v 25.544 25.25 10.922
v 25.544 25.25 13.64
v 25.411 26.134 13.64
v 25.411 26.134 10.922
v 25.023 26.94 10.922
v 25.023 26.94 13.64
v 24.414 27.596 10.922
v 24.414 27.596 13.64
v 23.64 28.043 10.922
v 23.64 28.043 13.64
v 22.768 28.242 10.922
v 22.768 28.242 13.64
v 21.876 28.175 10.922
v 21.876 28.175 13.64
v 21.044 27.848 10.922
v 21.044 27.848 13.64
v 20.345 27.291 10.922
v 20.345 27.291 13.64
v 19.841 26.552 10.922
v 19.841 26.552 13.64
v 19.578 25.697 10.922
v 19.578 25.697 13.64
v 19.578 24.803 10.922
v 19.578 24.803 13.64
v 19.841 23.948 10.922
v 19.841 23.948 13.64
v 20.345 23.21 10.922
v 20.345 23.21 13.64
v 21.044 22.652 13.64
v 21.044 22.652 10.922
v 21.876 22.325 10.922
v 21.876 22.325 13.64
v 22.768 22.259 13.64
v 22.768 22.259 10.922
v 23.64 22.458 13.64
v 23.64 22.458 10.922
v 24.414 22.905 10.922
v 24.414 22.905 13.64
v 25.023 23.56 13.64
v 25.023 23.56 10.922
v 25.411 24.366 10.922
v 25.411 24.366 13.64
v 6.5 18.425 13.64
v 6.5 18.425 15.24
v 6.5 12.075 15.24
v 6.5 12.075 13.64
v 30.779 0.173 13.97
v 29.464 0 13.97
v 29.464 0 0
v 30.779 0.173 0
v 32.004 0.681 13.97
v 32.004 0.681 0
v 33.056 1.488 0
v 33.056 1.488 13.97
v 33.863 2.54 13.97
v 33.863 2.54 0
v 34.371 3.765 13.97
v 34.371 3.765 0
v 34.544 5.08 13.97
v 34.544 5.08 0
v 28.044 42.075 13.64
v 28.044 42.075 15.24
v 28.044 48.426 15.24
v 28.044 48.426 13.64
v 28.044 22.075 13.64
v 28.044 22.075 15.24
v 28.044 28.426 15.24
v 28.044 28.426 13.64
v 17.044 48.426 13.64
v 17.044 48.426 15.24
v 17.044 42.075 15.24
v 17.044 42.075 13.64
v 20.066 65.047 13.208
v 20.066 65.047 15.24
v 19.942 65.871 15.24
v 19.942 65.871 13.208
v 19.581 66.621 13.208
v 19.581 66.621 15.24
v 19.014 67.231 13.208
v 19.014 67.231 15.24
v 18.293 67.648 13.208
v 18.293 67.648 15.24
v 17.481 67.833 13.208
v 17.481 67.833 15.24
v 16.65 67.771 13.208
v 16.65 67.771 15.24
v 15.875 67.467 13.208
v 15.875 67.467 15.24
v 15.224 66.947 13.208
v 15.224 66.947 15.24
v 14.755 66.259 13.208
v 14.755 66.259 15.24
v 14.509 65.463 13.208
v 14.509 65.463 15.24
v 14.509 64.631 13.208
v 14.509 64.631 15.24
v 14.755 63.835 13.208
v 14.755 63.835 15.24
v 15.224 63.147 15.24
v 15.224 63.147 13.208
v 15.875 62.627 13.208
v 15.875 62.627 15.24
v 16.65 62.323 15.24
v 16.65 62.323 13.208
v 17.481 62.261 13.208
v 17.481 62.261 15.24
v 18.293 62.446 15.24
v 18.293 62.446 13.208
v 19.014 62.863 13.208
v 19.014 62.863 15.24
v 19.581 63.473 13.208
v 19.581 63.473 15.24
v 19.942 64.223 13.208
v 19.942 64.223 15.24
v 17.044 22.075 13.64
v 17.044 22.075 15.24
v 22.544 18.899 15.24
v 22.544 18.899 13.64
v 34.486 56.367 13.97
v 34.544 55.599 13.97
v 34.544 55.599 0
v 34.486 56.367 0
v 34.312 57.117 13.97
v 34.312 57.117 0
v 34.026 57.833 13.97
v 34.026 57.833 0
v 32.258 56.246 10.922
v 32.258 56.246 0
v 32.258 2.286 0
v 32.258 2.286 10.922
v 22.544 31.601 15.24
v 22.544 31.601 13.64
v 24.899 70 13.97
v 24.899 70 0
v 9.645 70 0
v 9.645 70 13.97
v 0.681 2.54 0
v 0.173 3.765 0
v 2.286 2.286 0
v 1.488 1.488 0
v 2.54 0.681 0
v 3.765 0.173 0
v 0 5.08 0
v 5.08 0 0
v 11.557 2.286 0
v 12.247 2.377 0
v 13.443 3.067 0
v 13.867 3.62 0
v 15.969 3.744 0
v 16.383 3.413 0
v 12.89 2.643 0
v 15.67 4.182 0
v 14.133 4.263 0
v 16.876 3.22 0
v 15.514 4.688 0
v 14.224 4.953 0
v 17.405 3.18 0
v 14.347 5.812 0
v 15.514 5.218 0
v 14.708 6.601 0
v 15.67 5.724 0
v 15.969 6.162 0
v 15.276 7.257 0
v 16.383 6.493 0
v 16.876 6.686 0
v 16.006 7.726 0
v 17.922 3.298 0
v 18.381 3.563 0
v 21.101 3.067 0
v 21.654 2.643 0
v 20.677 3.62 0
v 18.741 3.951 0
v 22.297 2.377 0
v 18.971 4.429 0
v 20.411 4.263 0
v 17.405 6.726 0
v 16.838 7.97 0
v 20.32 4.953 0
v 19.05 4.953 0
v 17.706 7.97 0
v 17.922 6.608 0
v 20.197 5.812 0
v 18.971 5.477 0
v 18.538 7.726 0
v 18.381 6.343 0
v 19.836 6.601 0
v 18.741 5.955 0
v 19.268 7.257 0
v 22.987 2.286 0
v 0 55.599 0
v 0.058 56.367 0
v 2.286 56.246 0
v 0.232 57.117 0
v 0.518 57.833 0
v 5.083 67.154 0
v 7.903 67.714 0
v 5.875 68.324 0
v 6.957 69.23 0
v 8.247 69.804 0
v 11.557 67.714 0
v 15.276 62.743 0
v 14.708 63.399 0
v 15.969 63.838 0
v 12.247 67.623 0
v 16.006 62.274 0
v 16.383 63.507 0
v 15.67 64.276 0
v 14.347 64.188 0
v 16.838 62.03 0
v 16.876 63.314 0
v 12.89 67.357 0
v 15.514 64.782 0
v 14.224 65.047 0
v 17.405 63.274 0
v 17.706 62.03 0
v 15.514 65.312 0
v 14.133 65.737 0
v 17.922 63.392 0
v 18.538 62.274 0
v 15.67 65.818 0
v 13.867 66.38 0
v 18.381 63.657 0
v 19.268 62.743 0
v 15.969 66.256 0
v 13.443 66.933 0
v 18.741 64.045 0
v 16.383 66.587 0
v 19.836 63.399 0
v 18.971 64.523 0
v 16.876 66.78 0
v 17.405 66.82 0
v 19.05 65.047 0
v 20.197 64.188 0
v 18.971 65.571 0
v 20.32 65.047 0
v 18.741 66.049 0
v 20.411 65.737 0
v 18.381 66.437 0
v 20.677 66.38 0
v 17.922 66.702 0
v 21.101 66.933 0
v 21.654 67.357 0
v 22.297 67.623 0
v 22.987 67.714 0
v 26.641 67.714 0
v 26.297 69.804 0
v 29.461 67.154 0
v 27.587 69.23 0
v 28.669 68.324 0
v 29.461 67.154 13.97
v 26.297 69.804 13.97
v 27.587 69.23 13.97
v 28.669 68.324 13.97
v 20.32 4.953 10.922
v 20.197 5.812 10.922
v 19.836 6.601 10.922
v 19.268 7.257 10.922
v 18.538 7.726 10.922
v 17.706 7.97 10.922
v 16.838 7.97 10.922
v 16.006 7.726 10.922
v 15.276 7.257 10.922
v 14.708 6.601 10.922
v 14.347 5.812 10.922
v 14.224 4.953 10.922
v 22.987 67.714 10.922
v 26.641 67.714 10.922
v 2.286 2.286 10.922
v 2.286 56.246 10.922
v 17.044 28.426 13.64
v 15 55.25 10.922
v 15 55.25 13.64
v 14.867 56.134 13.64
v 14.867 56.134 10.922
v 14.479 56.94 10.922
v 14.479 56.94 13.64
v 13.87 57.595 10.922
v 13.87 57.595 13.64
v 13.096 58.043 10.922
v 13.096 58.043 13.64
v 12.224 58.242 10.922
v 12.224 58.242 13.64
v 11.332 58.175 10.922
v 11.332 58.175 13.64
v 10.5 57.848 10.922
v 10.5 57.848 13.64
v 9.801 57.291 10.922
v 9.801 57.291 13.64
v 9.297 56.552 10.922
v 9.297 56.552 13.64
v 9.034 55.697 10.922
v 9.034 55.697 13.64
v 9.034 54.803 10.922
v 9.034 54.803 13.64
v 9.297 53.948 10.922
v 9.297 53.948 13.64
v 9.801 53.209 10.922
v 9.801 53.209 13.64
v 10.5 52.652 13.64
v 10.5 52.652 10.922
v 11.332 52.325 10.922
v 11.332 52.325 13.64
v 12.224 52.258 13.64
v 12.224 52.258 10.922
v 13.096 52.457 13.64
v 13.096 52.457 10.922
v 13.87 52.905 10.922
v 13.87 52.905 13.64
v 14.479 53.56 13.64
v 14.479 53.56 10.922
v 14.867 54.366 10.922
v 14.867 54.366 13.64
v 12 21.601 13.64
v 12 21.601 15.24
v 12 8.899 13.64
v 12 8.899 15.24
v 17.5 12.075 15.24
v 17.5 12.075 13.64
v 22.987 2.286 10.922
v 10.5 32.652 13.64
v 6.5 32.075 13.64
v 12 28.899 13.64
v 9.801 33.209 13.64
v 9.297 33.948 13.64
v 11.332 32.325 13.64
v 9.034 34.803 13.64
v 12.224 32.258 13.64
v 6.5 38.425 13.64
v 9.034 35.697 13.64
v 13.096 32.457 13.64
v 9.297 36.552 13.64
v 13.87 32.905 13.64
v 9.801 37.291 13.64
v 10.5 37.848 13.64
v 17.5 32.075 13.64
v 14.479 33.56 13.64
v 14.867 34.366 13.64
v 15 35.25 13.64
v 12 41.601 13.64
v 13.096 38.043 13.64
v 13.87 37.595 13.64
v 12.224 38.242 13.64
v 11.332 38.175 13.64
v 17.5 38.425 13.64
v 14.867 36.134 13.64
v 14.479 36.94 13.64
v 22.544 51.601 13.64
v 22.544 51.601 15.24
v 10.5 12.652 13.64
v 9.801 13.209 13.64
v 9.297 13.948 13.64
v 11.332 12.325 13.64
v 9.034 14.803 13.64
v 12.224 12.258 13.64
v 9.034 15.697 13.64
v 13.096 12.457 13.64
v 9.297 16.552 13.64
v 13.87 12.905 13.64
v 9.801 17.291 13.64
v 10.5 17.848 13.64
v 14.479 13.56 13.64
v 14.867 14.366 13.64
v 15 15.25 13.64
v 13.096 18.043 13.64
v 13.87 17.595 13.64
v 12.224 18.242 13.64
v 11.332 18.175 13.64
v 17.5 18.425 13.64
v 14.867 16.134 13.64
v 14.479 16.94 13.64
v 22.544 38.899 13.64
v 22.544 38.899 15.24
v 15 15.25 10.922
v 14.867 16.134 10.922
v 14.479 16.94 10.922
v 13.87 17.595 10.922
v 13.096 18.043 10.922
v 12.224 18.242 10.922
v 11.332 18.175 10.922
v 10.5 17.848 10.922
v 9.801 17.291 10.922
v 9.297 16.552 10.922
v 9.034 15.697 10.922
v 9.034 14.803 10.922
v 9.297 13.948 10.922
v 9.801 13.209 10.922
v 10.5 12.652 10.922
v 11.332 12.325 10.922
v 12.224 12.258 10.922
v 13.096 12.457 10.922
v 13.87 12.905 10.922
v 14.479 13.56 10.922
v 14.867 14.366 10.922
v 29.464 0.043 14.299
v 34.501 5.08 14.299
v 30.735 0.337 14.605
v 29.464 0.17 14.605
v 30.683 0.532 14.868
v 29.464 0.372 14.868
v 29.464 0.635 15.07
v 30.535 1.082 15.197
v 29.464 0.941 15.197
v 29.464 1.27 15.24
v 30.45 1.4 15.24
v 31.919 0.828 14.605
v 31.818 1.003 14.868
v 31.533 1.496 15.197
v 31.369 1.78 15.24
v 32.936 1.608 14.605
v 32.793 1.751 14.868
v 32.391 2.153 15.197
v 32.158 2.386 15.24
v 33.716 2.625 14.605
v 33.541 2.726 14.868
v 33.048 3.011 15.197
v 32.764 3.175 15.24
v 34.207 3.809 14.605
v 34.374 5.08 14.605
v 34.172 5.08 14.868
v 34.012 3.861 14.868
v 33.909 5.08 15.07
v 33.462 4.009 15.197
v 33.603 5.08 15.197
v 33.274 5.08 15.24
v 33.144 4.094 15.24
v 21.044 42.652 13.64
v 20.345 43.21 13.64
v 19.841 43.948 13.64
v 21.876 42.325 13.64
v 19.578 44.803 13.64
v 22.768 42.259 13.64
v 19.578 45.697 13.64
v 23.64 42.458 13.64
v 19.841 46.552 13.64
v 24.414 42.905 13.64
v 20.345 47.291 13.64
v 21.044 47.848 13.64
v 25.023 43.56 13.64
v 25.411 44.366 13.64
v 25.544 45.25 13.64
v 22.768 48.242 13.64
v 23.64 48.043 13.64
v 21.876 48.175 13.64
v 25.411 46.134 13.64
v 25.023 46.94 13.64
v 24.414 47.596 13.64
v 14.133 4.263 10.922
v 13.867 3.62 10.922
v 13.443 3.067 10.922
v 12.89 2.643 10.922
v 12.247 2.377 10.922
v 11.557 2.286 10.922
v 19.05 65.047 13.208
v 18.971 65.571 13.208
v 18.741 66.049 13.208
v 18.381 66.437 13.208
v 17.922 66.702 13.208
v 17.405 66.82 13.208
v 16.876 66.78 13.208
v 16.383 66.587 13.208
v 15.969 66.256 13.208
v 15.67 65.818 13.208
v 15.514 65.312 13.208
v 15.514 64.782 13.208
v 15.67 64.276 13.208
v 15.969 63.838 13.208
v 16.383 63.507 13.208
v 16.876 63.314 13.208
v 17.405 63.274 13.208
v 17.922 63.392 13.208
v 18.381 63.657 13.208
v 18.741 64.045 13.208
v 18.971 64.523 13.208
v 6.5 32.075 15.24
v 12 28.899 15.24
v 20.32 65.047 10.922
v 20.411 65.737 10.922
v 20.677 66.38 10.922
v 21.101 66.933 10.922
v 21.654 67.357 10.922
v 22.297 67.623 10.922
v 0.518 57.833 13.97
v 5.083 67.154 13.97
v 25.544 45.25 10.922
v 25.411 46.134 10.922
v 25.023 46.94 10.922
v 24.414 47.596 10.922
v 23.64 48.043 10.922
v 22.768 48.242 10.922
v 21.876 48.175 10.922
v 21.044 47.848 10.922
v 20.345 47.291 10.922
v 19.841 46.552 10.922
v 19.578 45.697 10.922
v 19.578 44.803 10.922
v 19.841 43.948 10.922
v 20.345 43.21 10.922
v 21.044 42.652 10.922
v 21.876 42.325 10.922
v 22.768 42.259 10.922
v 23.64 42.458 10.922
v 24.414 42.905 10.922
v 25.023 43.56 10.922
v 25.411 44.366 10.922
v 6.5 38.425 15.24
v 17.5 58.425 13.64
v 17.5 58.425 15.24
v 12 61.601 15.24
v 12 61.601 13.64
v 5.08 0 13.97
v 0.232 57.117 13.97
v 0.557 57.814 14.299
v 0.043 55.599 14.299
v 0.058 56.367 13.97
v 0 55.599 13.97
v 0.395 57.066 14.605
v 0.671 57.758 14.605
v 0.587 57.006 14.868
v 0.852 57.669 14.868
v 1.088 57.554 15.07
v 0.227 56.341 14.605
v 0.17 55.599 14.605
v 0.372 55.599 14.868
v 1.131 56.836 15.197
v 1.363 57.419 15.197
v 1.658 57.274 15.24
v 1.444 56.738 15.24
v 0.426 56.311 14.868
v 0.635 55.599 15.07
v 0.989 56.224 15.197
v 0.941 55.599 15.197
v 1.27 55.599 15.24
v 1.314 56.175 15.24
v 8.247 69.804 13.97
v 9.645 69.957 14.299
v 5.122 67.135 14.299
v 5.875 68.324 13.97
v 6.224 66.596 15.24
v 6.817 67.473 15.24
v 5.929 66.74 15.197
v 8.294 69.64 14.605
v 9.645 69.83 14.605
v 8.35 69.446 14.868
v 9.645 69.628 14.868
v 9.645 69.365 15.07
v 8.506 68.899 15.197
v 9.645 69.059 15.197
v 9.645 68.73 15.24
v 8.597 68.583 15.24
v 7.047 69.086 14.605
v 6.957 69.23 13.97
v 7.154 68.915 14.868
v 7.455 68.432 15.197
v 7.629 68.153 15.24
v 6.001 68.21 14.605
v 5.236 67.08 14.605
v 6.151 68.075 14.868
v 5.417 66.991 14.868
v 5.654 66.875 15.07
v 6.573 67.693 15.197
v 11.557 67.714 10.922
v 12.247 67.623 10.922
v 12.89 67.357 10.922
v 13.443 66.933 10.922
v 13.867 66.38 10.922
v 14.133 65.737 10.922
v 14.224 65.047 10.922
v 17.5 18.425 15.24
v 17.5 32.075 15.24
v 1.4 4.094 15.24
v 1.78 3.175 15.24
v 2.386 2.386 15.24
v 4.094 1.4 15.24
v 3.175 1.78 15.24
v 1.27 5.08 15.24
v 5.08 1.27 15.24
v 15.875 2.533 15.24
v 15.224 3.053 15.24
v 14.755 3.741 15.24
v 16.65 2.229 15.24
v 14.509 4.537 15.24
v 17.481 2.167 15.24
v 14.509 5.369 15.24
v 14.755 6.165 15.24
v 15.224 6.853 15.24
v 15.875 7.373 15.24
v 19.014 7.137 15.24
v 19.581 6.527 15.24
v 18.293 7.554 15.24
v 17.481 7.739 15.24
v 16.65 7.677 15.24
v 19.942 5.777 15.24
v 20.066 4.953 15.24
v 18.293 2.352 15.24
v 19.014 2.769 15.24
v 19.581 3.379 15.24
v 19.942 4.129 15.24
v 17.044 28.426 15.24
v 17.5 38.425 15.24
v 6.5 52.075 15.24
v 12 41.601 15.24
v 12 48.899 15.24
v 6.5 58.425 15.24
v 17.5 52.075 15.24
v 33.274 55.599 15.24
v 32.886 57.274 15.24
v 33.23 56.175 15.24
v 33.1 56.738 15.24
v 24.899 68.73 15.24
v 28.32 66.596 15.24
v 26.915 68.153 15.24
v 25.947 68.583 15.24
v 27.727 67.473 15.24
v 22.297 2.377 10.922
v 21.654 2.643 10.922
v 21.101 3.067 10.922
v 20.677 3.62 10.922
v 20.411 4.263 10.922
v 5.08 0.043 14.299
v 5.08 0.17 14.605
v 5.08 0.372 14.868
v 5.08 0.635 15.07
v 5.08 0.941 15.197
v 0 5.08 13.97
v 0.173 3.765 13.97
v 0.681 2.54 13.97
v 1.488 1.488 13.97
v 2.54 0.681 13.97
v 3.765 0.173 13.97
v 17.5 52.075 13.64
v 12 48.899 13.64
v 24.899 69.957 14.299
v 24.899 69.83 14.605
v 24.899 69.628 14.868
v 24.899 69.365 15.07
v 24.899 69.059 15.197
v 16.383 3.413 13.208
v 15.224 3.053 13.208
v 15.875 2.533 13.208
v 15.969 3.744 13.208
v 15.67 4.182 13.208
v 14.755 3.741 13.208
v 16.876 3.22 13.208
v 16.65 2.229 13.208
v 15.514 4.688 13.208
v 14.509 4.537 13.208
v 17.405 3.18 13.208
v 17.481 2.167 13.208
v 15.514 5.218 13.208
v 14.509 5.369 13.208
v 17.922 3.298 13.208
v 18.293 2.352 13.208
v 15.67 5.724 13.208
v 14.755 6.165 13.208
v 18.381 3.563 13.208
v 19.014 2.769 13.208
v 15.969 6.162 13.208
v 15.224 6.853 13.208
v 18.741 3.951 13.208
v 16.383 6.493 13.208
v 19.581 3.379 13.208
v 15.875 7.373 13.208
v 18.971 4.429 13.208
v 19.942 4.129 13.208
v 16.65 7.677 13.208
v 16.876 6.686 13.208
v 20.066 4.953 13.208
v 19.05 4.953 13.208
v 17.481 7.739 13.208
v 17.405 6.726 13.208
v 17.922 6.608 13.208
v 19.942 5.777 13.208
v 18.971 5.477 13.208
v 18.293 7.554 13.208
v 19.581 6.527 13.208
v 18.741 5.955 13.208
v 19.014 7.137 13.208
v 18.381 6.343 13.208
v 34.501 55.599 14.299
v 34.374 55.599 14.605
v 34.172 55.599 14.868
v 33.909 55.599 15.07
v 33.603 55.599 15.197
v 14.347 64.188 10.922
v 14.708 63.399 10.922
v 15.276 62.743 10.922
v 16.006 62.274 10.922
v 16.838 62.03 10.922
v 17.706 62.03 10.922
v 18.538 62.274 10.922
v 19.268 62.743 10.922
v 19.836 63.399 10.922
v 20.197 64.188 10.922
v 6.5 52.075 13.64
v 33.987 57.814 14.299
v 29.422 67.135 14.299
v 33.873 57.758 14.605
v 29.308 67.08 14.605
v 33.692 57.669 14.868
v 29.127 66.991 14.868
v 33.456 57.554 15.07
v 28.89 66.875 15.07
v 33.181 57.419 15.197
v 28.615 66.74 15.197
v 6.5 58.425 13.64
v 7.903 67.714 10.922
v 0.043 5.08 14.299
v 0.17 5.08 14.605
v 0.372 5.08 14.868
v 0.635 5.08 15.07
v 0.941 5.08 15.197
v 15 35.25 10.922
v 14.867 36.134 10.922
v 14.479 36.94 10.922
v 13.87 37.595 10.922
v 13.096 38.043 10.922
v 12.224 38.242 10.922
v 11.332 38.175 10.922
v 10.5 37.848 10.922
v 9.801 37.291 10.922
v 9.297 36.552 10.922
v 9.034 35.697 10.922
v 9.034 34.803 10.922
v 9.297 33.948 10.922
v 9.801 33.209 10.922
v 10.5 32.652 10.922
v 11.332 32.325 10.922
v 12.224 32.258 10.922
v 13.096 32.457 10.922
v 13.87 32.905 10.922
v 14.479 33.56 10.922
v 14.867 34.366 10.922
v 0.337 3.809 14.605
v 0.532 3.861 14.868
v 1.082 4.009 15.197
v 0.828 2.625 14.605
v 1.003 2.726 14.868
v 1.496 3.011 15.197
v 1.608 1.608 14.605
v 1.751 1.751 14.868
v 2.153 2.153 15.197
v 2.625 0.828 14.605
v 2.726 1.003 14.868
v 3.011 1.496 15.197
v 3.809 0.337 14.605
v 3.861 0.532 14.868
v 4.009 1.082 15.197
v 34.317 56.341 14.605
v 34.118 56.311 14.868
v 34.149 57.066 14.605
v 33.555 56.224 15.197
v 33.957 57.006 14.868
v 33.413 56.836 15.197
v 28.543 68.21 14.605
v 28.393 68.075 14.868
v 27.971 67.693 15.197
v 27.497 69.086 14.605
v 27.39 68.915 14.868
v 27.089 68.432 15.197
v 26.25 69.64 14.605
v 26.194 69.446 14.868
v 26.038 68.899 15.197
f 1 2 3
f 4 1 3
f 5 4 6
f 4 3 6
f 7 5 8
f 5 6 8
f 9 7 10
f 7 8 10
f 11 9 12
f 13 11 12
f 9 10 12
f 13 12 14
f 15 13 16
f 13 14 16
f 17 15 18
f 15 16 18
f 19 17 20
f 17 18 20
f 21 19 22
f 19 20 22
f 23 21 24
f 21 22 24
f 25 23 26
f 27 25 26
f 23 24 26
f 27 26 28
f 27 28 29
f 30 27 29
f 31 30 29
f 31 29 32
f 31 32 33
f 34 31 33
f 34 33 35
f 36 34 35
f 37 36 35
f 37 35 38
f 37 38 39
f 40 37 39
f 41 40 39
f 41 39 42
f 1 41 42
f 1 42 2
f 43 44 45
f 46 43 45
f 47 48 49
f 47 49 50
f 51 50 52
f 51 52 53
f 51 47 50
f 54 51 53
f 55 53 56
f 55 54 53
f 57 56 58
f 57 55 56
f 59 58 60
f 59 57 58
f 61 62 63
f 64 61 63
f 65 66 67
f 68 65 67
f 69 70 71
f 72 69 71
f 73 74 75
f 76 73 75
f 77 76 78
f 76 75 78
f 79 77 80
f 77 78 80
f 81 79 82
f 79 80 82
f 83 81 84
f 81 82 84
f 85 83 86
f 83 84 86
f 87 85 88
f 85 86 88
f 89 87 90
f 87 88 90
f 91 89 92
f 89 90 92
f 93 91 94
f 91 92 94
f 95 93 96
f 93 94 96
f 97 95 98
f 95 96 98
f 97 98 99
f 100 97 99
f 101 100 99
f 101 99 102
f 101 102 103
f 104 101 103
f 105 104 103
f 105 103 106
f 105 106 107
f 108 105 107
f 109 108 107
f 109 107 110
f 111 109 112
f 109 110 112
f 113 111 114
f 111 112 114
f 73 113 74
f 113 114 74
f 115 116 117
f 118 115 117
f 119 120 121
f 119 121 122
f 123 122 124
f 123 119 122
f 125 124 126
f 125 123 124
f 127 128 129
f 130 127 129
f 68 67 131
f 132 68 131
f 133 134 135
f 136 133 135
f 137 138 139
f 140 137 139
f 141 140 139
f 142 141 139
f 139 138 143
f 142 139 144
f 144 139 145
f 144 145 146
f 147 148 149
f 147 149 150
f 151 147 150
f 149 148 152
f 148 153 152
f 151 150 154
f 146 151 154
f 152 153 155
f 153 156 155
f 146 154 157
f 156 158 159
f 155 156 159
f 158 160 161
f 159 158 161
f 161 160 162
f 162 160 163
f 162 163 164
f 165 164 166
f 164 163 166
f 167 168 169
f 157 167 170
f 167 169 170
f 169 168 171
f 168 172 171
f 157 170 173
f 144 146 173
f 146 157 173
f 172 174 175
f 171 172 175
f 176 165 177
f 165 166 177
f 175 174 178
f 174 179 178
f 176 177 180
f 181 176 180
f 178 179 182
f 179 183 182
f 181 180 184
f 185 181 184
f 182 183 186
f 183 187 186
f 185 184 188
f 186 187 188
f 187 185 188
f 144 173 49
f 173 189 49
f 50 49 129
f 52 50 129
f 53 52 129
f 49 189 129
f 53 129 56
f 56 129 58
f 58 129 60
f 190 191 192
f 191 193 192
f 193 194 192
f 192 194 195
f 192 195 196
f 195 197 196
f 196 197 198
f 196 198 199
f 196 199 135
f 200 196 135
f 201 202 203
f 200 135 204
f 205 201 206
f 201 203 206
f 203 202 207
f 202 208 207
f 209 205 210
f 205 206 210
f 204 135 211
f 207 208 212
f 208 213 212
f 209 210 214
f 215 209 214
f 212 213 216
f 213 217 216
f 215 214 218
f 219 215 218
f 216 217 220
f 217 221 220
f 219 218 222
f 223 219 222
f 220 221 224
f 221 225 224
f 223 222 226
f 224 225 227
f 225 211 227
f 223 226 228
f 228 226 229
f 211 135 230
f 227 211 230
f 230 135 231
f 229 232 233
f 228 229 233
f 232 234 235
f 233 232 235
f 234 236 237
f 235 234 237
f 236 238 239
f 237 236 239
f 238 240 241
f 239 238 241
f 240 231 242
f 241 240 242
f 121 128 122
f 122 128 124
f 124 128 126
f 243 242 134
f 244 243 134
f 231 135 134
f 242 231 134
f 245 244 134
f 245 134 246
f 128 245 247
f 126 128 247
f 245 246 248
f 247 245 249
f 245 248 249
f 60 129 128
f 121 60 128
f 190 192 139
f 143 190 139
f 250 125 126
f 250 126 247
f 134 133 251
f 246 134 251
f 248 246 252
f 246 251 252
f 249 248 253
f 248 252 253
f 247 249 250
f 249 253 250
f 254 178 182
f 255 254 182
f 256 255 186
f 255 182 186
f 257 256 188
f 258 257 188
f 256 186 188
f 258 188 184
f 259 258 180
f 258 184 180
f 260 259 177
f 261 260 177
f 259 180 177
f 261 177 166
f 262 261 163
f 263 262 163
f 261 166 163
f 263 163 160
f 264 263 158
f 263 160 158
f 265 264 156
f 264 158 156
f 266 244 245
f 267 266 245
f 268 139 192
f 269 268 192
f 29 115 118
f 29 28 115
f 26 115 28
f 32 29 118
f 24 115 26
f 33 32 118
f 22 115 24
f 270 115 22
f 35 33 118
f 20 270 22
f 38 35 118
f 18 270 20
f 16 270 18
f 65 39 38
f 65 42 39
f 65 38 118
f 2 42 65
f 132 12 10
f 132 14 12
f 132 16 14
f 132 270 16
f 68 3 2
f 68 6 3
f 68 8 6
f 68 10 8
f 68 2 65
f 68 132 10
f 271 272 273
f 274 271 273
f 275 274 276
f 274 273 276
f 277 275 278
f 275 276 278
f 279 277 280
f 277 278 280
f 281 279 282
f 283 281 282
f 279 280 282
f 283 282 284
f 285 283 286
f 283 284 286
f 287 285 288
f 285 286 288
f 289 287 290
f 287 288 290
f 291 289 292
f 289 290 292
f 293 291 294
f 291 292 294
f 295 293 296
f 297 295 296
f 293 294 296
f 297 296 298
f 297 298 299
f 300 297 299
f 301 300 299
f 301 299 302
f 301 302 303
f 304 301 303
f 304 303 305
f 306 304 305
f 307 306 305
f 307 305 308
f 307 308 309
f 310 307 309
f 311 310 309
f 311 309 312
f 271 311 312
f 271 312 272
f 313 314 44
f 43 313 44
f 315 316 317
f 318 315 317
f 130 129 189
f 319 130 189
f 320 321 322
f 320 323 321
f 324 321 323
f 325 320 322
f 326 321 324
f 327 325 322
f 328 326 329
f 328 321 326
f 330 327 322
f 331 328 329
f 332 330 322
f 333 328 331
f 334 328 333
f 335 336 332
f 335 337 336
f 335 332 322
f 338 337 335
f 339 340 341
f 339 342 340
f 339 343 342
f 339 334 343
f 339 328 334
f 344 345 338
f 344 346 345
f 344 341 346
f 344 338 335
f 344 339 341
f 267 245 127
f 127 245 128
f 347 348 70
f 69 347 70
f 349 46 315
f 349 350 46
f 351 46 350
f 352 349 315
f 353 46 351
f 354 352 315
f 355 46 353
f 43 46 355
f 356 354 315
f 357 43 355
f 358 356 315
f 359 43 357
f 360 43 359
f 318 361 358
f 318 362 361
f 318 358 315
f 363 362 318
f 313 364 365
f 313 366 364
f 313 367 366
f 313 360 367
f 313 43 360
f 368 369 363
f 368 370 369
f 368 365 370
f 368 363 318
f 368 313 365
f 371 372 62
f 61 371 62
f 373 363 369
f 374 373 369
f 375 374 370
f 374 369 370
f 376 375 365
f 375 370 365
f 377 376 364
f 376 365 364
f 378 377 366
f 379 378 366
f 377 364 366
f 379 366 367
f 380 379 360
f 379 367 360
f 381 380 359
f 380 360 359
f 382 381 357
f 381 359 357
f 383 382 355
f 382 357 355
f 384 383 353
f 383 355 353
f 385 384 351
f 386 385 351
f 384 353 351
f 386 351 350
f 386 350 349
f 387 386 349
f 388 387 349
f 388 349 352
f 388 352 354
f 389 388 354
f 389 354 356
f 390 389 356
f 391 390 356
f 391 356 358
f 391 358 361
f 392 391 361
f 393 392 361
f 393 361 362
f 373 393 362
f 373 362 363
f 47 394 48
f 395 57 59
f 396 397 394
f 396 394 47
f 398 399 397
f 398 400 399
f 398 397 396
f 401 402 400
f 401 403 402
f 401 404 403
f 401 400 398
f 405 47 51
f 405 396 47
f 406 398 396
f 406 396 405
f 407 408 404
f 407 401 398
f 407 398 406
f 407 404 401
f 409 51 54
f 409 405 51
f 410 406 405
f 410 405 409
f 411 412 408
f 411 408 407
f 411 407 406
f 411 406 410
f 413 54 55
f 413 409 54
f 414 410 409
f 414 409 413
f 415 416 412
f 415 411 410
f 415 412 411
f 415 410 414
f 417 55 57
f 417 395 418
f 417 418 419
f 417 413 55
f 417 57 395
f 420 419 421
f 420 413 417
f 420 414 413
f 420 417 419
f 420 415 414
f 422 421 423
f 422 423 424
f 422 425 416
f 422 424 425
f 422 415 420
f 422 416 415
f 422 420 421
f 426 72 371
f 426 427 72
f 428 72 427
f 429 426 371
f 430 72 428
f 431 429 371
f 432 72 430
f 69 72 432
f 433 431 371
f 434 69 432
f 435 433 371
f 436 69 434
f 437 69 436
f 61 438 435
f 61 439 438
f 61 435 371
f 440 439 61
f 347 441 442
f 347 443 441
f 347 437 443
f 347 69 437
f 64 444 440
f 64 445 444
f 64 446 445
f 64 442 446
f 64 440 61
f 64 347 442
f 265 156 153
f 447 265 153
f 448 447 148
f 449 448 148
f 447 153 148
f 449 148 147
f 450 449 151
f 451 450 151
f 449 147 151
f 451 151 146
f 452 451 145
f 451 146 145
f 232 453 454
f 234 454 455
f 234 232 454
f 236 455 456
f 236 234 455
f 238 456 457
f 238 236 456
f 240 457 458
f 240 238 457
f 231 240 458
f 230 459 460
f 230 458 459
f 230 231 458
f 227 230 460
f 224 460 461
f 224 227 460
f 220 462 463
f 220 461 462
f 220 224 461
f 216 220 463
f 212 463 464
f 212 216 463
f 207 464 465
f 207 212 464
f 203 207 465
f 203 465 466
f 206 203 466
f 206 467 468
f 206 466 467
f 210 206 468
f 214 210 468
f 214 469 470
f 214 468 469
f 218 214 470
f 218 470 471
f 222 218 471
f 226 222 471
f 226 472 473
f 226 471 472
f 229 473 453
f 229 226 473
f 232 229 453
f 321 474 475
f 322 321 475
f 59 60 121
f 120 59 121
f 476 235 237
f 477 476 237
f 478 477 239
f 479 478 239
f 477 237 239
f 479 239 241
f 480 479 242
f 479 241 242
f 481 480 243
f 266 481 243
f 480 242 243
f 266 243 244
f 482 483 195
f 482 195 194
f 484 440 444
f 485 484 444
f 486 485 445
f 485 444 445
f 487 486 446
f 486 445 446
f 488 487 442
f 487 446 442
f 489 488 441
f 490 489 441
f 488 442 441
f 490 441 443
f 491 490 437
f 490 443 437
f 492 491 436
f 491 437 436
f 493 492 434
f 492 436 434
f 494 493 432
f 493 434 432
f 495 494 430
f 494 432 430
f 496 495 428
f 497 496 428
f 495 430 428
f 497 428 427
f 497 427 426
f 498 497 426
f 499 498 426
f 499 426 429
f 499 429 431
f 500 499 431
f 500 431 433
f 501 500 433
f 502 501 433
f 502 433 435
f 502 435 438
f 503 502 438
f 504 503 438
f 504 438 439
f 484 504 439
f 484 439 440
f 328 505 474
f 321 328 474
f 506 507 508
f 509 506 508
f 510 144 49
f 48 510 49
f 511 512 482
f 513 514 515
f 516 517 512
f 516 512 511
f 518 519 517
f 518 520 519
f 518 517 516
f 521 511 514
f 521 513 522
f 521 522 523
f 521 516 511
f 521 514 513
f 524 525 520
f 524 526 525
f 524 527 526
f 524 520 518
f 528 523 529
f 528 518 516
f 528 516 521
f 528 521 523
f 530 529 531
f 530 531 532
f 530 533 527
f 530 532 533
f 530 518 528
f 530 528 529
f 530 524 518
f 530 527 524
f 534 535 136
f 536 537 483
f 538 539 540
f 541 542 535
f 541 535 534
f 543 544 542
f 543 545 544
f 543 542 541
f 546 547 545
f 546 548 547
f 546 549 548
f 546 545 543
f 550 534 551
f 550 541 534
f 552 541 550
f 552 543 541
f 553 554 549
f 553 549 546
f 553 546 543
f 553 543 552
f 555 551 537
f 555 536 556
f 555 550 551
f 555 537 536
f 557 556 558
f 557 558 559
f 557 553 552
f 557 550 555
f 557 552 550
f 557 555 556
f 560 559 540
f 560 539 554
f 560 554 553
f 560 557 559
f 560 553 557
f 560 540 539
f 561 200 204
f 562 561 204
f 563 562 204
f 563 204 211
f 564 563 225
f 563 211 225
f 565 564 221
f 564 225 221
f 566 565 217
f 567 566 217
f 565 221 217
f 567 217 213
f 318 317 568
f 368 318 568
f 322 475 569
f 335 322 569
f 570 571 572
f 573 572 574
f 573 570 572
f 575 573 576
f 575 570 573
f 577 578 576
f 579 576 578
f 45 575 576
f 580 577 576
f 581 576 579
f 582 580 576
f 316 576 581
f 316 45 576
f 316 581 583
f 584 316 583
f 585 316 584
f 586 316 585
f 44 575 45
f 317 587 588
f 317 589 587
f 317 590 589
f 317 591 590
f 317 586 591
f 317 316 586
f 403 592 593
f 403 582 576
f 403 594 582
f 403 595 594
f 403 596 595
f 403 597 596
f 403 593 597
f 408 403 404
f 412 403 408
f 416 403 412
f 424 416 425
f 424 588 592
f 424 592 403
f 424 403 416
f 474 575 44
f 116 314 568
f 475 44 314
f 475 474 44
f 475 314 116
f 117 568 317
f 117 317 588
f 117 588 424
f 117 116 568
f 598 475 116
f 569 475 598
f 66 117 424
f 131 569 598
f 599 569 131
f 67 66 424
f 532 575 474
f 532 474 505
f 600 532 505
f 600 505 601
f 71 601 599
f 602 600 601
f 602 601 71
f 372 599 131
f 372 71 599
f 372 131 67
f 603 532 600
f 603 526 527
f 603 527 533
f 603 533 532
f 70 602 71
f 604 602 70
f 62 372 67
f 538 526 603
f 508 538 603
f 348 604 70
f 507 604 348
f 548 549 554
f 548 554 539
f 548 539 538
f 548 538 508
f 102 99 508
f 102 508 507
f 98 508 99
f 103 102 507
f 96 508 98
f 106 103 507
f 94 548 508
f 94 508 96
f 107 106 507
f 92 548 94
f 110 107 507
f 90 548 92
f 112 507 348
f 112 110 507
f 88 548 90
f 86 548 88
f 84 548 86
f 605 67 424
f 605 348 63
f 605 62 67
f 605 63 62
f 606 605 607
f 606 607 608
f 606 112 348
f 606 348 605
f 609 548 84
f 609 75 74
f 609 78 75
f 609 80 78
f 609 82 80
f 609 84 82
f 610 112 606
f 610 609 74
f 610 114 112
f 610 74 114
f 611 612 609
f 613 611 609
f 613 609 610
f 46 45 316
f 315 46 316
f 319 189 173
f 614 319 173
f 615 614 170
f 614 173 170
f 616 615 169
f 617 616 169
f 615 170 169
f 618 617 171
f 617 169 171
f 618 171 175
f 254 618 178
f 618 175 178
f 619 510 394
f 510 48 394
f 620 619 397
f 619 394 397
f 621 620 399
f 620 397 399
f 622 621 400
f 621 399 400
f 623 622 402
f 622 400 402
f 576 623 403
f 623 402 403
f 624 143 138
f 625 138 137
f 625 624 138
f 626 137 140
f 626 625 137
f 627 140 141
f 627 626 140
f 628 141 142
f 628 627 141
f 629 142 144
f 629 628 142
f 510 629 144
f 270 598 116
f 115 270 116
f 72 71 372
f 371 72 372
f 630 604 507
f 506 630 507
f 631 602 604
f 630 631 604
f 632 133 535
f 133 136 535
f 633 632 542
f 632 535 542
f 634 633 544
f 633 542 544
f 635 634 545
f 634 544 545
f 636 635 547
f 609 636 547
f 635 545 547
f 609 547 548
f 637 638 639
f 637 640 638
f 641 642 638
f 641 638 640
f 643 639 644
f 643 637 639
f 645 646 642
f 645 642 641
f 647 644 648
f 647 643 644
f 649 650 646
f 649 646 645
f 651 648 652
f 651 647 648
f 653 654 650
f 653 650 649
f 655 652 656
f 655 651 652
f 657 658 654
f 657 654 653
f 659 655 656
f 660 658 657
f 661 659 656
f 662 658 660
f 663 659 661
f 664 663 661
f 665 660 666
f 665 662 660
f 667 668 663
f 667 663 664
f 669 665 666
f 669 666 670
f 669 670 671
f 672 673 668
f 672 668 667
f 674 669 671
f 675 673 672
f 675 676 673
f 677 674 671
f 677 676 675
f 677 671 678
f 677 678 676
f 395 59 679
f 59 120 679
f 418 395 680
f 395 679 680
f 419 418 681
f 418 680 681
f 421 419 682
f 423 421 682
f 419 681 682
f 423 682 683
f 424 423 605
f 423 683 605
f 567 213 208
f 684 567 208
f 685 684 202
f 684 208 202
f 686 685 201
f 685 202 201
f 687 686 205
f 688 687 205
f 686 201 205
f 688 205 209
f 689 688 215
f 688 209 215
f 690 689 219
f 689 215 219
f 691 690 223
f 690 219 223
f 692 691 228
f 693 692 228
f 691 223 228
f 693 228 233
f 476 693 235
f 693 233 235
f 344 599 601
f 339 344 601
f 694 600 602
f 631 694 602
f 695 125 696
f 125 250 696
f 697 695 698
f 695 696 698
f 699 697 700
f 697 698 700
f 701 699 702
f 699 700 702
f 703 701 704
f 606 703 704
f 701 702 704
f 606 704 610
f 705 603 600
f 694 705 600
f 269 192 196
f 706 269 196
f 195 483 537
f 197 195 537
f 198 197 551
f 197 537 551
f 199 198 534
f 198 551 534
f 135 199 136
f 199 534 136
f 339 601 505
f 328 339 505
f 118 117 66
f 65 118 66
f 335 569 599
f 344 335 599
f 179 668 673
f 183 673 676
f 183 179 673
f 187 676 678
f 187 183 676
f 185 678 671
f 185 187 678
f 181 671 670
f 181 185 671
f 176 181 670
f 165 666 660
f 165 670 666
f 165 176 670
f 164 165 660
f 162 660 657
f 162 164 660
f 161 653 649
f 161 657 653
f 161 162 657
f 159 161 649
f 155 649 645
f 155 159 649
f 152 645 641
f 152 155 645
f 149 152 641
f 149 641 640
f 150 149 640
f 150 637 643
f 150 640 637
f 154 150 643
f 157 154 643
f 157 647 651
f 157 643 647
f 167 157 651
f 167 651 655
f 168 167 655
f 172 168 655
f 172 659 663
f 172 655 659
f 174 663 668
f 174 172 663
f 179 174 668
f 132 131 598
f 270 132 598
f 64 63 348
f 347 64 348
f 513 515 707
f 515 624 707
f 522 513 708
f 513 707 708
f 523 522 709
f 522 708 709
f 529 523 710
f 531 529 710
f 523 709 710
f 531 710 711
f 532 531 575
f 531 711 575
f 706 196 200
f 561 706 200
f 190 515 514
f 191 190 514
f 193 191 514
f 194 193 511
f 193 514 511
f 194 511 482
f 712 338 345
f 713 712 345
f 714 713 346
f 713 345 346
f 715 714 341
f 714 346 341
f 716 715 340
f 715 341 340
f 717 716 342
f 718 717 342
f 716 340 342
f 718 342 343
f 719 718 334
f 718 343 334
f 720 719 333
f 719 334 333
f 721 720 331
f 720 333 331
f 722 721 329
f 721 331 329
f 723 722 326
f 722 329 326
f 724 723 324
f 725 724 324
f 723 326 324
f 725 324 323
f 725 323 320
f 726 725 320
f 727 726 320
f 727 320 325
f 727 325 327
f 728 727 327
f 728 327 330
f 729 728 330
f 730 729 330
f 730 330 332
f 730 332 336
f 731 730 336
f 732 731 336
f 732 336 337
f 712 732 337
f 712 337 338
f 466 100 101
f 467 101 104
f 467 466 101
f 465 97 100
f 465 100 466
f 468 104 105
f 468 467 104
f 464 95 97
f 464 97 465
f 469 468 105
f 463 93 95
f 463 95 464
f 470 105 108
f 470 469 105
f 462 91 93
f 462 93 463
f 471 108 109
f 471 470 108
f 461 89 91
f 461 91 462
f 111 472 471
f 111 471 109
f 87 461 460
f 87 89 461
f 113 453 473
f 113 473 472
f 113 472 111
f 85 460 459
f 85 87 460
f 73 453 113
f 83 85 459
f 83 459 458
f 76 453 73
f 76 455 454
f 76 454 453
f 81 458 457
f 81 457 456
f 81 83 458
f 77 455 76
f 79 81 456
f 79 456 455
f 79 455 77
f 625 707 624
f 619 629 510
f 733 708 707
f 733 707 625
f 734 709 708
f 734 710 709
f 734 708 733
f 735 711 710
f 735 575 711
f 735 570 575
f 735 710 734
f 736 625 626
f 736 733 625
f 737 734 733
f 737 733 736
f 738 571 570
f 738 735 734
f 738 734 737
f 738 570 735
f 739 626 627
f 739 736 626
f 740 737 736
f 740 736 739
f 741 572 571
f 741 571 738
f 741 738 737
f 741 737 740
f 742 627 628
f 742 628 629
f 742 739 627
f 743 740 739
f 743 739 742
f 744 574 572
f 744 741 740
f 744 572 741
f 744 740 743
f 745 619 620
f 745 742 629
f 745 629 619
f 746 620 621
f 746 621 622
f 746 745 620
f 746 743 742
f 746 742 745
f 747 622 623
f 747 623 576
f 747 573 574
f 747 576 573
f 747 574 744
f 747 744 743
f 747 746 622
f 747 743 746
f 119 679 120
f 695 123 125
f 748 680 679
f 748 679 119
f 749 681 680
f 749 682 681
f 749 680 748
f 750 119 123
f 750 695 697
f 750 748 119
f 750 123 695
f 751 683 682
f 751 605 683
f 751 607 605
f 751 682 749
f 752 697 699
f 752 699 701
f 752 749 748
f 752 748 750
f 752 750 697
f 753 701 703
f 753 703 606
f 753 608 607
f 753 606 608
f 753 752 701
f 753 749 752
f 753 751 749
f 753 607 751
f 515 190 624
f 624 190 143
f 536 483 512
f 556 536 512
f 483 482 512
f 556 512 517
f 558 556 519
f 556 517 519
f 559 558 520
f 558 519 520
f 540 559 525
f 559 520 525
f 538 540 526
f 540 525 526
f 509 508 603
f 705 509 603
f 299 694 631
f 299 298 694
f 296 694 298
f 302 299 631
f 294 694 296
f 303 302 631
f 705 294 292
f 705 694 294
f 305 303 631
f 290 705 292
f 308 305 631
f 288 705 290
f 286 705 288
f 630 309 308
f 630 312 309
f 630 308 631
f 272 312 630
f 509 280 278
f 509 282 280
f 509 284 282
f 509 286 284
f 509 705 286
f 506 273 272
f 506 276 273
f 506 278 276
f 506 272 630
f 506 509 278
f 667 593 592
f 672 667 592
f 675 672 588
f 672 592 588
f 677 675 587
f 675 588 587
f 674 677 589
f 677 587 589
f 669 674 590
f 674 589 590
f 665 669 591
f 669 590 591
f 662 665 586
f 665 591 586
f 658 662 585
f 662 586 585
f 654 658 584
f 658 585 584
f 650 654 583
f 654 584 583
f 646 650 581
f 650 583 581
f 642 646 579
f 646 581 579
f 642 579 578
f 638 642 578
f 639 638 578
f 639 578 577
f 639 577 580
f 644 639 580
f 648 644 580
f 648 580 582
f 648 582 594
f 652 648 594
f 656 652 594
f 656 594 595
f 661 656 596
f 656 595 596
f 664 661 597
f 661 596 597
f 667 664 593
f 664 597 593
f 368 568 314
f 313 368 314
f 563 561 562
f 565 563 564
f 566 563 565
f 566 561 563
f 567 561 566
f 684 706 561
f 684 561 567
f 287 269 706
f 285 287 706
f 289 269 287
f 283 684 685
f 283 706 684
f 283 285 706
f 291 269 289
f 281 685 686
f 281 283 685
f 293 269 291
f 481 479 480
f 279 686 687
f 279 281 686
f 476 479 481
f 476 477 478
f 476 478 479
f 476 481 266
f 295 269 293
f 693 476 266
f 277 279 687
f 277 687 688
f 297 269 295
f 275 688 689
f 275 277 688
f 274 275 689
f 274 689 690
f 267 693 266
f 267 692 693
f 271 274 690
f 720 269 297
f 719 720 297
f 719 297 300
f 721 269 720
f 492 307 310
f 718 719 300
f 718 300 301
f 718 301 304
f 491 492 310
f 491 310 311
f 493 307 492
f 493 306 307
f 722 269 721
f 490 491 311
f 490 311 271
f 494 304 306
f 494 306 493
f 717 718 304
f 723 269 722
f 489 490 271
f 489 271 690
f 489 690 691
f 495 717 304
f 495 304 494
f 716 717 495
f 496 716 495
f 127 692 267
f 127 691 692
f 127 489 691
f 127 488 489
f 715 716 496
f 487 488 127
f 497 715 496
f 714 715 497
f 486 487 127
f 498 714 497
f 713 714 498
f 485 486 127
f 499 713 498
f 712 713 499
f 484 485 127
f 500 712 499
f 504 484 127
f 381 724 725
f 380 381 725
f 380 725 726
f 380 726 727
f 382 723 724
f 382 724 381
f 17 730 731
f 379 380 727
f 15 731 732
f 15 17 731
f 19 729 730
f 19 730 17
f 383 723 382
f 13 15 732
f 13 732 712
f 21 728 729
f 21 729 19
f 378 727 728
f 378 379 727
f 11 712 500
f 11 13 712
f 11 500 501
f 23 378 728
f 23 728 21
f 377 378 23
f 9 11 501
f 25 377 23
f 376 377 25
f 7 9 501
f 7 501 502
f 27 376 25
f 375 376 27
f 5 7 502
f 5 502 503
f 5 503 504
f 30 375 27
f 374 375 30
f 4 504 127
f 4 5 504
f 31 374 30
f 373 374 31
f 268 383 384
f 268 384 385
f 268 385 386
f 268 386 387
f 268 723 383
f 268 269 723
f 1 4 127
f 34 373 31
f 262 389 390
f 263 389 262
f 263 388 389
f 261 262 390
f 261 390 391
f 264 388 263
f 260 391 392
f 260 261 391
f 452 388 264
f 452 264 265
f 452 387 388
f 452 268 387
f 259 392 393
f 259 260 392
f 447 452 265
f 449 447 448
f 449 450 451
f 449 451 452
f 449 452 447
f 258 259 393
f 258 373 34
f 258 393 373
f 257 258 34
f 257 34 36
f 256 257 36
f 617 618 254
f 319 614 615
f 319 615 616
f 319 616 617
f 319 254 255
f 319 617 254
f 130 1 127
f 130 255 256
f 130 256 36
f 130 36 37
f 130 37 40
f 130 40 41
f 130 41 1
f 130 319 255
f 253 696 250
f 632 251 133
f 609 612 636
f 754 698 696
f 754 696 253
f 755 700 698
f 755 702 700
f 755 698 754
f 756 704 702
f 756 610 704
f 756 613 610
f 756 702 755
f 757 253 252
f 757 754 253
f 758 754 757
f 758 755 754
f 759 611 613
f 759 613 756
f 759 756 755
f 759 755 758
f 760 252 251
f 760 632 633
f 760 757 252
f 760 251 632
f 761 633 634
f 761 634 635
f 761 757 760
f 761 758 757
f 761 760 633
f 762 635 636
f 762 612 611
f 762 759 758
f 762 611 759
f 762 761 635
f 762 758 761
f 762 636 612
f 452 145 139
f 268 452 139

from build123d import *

# Parameters (mm, degrees)
F0_R      = 1.778
F1_DEPTH  = 15.24
F3_DEPTH  = 10.922
F4_R      = 5.08
F5_R      = 1.27
F6_R      = 2.794
F7_DEPTH  = 2.032
F9_DEPTH  = 1.6
F10_R     = 3
F11_DEPTH = 25
F12_R     = 3
F13_DEPTH = 25
F14_R     = 3
F15_DEPTH = 25
F16_R     = 3
F17_DEPTH = 25
F18_R     = 3
F19_DEPTH = 25


with BuildPart() as f1:
    # F0 (on Top) → F1 (new body)
    with BuildSketch(Plane.XY):
        Polygon((0, 56.7757548102), (0, 0), (34.544, 0), (34.544, 56.7757548102), (28.067, 70), (6.477, 70), align=None)
        with Locations((17.272, 4.953)):
            Circle(F0_R, mode=Mode.SUBTRACT)
        with Locations((17.272, 65.047)):
            Circle(F0_R, mode=Mode.SUBTRACT)
    extrude(amount=F1_DEPTH)

    # F2 (on face) → F3 (cut)
    with BuildSketch(Plane(origin=(0, 0, 0), x_dir=(1, 0, 0), z_dir=(0, 0, -1))):
        with BuildLine():
            Line((26.6411766499, -67.714), (32.258, -56.2459979667))
            Line((32.258, -56.2459979667), (32.258, -2.286))
            Line((32.258, -2.286), (22.987, -2.286))
            ThreePointArc((22.987, -2.286), (21.1011462146, -3.0671462146), (20.32, -4.953))
            ThreePointArc((20.32, -4.953), (17.272, -8.001), (14.224, -4.953))
            ThreePointArc((14.224, -4.953), (13.4428537854, -3.0671462146), (11.557, -2.286))
            Line((11.557, -2.286), (2.286, -2.286))
            Line((2.286, -2.286), (2.286, -56.2459979667))
            Line((2.286, -56.2459979667), (7.9028233501, -67.714))
            Line((7.9028233501, -67.714), (11.557, -67.714))
            ThreePointArc((11.557, -67.714), (13.4428537854, -66.9328537854), (14.224, -65.047))
            ThreePointArc((14.224, -65.047), (17.272, -61.999), (20.32, -65.047))
            ThreePointArc((20.32, -65.047), (21.1011462146, -66.9328537854), (22.987, -67.714))
            Line((22.987, -67.714), (26.6411766499, -67.714))
        make_face()
    extrude(amount=-F3_DEPTH, mode=Mode.SUBTRACT)

    # F4
    f4_edges = [f1.edges().sort_by_distance(p)[0] for p in [
        (6.477, 70, 7.62),
        (28.067, 70, 7.62),
        (34.544, 56.775755, 7.62),
        (34.544, 0, 7.62),
        (0, 0, 7.62),
        (0, 56.775755, 7.62),
    ]]
    fillet(f4_edges, radius=F4_R)

    # F5
    f5_edges = [f1.edges().sort_by_distance(p)[0] for p in [
        (1.487898, 1.487898, 15.24),
        (33.056102, 1.487898, 15.24),
        (34.412853, 56.745363, 15.24),
        (0.131147, 56.745363, 15.24),
        (27.586929, 69.23031, 15.24),
        (6.957071, 69.23031, 15.24),
        (17.272, 0, 15.24),
        (0, 30.339259, 15.24),
        (2.800565, 62.493735, 15.24),
        (17.272, 70, 15.24),
        (31.743435, 62.493735, 15.24),
        (34.544, 30.339259, 15.24),
    ]]
    fillet(f5_edges, radius=F5_R)

    # F6 (on face) → F7 (cut)
    with BuildSketch(Plane.XY.offset(15.24)):
        with Locations((17.272, 65.047)):
            Circle(F6_R)
        with Locations((17.272, 4.953)):
            Circle(F6_R)
    extrude(amount=-F7_DEPTH, mode=Mode.SUBTRACT)

    # F8 (on face) → F9 (cut)
    with BuildSketch(Plane.XY.offset(15.24)):
        Polygon((17.5, 18.4254264805), (12, 21.6008529611), (6.5, 18.4254264805), (6.5, 12.0745735195), (12, 8.8991470389), (17.5, 12.0745735195), align=None)
        Polygon((17.5, 38.4254264805), (12, 41.6008529611), (6.5, 38.4254264805), (6.5, 32.0745735195), (12, 28.8991470389), (17.5, 32.0745735195), align=None)
        Polygon((28.044, 42.0747205584), (28.044, 48.4255735195), (22.544, 51.601), (17.044, 48.4255735195), (17.044, 42.0747205584), (22.544, 38.8992940778), align=None)
        Polygon((6.5, 58.4254264805), (6.5, 52.0745735195), (12, 48.8991470389), (17.5, 52.0745735195), (17.5, 58.4254264805), (12, 61.6008529611), align=None)
        Polygon((28.044, 22.0747205584), (28.044, 28.4255735195), (22.544, 31.601), (17.044, 28.4255735195), (17.044, 22.0747205584), (22.544, 18.8992940778), align=None)
    extrude(amount=-F9_DEPTH, mode=Mode.SUBTRACT)

    # F10 (on face) → F11 (cut)
    with BuildSketch(Plane.XY.offset(13.64)):
        with Locations((12, 35.25)):
            Circle(F10_R)
    extrude(amount=-F11_DEPTH, mode=Mode.SUBTRACT)

    # F12 (on face) → F13 (cut)
    with BuildSketch(Plane.XY.offset(13.64)):
        with Locations((22.544, 45.2501470389)):
            Circle(F12_R)
    extrude(amount=-F13_DEPTH, mode=Mode.SUBTRACT)

    # F14 (on face) → F15 (cut)
    with BuildSketch(Plane.XY.offset(13.64)):
        with Locations((22.544, 25.2501470389)):
            Circle(F14_R)
    extrude(amount=-F15_DEPTH, mode=Mode.SUBTRACT)

    # F16 (on face) → F17 (cut)
    with BuildSketch(Plane.XY.offset(13.64)):
        with Locations((12, 15.25)):
            Circle(F16_R)
    extrude(amount=-F17_DEPTH, mode=Mode.SUBTRACT)

    # F18 (on face) → F19 (cut)
    with BuildSketch(Plane.XY.offset(13.64)):
        with Locations((12, 55.25)):
            Circle(F18_R)
    extrude(amount=-F19_DEPTH, mode=Mode.SUBTRACT)


solid = f1.part
